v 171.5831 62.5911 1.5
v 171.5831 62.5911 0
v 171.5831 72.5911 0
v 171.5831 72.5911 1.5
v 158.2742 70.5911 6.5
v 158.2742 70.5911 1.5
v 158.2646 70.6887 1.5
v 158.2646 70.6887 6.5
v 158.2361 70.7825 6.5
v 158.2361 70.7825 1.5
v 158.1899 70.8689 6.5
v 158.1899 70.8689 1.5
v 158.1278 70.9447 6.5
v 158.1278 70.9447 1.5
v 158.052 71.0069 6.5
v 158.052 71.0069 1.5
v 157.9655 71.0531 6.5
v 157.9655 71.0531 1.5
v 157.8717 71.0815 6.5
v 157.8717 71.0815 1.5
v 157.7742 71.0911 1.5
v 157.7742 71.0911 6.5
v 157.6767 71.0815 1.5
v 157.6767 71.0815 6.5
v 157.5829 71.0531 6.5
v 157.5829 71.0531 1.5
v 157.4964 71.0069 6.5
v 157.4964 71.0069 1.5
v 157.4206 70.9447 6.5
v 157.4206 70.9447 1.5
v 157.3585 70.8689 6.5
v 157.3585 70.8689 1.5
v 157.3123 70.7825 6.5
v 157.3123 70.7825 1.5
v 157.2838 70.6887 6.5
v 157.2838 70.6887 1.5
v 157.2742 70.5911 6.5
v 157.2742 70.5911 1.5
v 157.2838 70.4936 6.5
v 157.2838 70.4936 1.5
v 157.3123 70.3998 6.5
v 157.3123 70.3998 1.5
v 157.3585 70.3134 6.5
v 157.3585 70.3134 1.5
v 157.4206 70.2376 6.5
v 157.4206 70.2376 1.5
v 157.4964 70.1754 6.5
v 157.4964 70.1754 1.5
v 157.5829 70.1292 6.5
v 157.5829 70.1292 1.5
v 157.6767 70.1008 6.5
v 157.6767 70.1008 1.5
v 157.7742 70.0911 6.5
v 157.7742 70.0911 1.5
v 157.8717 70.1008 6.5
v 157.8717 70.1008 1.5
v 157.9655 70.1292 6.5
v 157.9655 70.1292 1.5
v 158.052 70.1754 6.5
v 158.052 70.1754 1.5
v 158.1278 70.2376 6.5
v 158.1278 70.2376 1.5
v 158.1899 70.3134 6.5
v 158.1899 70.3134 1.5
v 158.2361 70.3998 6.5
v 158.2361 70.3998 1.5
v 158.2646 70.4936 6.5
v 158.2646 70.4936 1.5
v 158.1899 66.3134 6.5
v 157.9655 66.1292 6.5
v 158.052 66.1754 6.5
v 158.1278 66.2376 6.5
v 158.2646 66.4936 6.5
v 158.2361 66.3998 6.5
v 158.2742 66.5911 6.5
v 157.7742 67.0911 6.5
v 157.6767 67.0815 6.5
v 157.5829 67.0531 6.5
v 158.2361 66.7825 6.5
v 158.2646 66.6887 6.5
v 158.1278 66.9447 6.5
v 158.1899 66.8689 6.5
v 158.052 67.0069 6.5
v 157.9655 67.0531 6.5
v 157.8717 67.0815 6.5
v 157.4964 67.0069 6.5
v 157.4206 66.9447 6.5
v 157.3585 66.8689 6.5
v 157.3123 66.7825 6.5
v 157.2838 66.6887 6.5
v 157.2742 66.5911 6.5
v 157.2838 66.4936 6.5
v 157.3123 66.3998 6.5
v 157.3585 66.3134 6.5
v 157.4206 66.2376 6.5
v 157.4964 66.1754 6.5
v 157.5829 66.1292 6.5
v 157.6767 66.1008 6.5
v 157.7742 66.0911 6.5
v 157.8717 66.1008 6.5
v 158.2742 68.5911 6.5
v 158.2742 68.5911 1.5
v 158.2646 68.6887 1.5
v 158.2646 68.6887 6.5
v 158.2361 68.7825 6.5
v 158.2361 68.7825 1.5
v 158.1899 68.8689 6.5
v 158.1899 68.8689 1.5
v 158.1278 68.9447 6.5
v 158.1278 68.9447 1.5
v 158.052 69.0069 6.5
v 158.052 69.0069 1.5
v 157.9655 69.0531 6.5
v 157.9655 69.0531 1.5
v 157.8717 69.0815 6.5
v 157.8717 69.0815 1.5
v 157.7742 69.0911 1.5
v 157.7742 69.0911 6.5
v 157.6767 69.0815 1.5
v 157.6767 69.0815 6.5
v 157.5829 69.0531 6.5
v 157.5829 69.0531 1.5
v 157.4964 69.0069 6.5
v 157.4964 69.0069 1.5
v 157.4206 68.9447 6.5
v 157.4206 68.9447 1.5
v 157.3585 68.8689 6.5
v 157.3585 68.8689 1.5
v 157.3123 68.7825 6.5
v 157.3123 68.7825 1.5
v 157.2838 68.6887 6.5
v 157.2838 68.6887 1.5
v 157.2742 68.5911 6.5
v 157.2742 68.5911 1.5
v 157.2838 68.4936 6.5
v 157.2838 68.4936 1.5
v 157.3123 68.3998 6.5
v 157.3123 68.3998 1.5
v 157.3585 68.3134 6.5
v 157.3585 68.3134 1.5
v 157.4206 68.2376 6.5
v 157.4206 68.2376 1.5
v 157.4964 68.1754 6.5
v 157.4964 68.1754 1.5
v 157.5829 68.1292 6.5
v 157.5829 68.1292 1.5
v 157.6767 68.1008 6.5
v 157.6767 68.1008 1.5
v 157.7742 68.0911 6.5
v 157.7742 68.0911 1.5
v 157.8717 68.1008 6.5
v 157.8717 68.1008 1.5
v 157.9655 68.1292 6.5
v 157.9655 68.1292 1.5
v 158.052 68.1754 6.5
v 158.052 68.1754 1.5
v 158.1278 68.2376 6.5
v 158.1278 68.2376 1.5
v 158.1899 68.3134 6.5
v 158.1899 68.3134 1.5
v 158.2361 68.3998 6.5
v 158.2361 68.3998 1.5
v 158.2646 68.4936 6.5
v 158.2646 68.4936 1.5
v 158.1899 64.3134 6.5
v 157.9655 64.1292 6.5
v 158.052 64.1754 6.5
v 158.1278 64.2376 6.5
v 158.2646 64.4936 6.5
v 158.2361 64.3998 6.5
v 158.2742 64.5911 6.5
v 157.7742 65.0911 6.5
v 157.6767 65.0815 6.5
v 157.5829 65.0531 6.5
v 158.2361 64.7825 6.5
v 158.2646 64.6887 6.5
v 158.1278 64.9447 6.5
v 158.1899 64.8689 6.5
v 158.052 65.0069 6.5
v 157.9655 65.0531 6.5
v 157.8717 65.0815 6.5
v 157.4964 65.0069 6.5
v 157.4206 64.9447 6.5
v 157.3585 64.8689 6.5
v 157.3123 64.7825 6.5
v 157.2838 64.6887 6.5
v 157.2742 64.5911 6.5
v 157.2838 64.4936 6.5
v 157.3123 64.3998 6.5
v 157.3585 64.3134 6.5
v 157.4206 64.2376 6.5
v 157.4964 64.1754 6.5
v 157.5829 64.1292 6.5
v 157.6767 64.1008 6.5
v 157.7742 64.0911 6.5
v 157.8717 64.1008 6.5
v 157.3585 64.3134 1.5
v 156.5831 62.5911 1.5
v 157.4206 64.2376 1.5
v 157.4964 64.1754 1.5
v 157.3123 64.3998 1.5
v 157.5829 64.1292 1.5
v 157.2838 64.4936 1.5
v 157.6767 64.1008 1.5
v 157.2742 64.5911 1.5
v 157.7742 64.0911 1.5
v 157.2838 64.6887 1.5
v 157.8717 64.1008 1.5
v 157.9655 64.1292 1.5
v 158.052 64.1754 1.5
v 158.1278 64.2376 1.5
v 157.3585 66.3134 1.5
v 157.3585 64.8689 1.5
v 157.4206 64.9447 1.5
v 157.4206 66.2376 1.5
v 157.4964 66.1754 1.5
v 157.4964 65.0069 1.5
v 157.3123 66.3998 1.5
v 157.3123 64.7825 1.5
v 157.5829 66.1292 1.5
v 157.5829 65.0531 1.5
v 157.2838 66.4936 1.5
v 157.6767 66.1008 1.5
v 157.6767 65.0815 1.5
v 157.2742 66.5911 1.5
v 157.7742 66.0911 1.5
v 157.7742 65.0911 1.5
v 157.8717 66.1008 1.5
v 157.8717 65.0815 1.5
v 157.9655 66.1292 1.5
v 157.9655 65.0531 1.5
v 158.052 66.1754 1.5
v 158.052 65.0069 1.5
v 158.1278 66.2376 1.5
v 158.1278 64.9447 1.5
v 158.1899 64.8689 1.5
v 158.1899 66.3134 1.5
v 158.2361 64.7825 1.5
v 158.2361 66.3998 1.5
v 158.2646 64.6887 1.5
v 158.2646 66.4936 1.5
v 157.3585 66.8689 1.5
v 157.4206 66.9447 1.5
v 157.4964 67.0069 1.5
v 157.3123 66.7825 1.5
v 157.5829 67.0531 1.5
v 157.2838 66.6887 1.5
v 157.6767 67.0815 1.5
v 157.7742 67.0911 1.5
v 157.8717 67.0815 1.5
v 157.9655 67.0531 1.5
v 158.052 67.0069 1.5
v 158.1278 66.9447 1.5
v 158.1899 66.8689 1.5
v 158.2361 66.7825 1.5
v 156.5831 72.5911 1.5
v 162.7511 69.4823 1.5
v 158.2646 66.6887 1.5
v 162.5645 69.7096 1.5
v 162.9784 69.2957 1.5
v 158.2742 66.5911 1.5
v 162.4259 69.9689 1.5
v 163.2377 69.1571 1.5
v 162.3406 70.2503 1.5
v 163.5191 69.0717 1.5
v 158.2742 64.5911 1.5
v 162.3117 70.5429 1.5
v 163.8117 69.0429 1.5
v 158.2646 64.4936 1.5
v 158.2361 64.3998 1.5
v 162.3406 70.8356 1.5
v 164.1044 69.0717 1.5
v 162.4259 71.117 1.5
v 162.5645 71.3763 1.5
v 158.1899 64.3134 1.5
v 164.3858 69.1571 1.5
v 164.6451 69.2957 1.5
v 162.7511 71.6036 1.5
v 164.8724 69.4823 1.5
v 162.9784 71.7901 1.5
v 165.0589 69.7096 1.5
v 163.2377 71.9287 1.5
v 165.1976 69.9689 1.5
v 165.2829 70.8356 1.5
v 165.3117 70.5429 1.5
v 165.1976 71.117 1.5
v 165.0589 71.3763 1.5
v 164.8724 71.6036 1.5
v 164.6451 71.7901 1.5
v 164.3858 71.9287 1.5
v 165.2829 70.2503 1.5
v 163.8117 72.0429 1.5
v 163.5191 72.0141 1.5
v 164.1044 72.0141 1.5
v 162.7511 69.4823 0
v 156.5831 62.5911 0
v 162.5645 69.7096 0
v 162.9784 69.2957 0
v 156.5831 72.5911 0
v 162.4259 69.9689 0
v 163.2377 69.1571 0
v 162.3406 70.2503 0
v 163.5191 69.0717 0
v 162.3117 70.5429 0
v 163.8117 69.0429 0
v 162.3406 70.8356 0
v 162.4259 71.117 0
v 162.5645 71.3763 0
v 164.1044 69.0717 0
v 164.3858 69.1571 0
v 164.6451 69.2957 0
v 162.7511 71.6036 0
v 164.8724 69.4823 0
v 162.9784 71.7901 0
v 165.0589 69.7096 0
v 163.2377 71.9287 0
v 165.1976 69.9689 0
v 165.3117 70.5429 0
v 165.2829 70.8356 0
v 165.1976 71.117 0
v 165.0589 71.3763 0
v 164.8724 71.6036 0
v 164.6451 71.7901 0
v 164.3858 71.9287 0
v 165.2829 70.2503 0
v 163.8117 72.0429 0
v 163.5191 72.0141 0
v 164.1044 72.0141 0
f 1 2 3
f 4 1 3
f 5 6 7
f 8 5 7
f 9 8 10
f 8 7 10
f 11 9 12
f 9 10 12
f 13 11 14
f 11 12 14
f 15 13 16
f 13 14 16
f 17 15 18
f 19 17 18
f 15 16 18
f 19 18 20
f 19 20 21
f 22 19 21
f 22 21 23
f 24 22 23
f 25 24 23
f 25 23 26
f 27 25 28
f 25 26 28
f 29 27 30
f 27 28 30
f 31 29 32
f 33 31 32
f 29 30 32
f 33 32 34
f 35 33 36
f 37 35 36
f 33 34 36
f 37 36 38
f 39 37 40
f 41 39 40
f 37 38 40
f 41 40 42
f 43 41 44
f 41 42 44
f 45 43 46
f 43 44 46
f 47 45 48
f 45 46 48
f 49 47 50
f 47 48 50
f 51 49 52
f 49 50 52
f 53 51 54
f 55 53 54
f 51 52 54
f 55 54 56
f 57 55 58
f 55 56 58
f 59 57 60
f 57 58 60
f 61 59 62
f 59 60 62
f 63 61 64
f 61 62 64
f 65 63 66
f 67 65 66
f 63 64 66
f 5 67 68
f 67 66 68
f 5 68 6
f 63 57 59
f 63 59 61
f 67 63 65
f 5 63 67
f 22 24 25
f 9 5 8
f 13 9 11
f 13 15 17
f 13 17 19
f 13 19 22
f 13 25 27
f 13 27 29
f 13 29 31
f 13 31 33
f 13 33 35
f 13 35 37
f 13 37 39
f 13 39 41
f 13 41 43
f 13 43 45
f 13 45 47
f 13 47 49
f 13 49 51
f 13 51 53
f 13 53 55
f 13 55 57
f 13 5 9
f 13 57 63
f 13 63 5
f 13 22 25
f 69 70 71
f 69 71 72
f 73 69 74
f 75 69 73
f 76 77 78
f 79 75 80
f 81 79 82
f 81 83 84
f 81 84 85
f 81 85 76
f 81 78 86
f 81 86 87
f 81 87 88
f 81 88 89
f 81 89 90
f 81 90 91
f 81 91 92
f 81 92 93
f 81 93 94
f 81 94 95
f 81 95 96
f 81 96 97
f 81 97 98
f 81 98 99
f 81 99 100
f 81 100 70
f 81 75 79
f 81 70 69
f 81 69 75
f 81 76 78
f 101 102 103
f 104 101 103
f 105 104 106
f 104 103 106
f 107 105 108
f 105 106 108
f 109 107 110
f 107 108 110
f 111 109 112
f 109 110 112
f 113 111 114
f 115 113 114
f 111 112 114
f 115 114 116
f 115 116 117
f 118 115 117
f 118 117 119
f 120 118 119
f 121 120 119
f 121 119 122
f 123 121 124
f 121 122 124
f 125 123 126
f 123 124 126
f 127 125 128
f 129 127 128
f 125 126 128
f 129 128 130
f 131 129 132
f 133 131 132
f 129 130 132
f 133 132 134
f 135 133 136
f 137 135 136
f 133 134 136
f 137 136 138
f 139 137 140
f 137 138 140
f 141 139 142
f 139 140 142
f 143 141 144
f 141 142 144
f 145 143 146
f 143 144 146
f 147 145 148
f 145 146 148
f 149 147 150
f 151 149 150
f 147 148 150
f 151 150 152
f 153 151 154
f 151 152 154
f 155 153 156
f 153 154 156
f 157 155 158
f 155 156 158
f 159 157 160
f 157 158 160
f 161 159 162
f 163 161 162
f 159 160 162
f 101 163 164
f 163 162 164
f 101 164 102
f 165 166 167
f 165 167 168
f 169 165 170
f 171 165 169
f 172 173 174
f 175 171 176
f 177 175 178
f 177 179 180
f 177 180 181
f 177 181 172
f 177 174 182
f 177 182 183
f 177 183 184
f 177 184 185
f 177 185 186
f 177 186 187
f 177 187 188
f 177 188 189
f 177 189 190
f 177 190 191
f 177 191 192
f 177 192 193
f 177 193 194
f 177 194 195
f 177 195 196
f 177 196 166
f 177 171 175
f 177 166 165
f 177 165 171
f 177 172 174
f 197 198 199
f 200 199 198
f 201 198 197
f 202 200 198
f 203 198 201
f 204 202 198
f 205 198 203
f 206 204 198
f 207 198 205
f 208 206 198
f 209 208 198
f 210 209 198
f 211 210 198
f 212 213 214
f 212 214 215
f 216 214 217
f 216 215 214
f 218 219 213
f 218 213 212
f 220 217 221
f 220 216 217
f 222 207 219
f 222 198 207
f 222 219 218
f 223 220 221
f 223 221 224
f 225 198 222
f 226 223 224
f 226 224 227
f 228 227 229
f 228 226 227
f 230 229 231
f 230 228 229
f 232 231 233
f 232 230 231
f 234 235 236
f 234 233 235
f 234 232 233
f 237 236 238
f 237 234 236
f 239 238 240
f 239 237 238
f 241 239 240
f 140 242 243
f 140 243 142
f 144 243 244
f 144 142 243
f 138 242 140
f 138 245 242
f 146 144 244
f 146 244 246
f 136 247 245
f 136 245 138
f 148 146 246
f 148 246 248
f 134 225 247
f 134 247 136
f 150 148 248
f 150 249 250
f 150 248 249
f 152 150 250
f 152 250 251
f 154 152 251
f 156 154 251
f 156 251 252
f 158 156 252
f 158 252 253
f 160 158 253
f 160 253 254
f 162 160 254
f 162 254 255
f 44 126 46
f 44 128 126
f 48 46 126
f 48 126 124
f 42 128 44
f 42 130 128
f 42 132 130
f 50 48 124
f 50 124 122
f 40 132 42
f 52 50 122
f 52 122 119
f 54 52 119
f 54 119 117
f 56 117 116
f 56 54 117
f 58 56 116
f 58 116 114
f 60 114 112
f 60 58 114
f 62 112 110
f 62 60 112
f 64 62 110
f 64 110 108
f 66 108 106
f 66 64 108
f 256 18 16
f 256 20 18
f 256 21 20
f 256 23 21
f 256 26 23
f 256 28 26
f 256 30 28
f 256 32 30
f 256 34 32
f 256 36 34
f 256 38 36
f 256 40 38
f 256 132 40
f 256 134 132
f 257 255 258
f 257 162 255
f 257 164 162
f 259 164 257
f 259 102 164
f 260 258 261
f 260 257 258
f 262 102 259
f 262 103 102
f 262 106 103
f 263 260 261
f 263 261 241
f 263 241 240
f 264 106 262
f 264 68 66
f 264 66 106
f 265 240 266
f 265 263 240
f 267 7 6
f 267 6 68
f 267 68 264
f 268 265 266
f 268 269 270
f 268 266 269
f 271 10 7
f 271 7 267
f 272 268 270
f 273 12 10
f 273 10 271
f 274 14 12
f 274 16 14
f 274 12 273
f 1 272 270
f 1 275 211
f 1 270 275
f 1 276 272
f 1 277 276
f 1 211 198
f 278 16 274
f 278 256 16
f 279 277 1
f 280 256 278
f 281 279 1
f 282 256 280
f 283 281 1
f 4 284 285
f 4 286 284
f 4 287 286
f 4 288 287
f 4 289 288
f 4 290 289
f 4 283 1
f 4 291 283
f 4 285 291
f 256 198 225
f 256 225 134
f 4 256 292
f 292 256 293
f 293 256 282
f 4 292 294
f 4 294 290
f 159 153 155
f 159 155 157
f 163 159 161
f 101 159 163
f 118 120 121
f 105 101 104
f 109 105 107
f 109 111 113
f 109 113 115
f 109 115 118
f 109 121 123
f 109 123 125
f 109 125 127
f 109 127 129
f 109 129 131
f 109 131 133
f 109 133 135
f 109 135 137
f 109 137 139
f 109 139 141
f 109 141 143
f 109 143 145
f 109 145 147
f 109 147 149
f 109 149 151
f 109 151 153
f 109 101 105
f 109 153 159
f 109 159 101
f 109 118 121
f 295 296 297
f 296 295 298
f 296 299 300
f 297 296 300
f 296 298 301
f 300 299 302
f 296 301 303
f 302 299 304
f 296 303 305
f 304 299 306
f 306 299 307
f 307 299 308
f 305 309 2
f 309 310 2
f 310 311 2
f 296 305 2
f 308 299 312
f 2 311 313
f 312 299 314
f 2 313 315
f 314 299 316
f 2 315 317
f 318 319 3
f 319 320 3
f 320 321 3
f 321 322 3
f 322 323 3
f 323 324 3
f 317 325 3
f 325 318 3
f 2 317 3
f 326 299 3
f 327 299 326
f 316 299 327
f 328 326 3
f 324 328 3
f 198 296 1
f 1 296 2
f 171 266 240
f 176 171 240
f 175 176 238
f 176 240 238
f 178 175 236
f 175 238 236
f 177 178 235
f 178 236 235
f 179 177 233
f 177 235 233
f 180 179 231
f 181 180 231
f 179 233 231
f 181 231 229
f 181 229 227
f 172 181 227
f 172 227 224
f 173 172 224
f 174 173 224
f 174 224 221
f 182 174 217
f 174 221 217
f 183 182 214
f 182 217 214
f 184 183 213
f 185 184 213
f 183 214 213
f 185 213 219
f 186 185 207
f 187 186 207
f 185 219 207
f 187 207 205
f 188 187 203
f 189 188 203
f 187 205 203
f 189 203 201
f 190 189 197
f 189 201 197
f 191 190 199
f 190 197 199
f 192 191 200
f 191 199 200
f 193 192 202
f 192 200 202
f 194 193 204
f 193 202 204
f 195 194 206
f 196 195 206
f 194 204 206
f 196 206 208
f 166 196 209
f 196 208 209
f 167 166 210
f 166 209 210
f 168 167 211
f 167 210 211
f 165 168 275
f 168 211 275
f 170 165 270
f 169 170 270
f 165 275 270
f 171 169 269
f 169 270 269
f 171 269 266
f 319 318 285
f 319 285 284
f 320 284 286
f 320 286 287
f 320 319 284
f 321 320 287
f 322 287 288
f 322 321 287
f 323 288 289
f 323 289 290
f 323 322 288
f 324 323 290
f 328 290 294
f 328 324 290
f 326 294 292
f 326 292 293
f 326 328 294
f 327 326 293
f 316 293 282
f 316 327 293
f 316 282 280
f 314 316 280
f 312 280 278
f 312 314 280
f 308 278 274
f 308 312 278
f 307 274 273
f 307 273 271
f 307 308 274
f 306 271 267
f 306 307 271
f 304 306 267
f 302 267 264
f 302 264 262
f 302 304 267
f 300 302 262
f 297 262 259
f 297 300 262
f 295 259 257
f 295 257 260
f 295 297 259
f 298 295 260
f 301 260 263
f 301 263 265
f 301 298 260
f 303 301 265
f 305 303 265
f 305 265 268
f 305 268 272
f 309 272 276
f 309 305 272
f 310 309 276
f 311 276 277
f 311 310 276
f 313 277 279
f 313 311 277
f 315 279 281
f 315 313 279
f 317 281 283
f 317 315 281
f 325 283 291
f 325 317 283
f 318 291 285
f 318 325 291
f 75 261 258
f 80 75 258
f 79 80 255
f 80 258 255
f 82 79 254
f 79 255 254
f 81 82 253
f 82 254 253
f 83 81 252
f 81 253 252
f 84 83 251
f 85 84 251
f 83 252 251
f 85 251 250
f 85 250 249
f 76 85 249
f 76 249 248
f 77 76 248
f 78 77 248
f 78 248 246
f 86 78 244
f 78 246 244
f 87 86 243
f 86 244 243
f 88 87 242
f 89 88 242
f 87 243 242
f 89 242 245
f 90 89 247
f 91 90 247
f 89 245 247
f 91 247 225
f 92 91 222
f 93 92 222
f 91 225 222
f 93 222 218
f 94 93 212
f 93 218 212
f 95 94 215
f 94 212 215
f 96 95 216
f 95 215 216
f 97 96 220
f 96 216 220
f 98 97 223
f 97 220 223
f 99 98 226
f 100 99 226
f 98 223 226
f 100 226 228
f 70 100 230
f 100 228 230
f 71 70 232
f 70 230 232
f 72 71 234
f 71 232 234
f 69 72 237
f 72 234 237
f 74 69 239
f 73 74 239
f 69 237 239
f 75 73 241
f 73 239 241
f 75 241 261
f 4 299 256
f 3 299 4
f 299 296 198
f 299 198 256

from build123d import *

# Parameters (mm, degrees)
SKETCH1_W           = 15
SKETCH1_H           = 10
SKETCH1_R           = 1.5
BOSS_EXTRUDE1_DEPTH = 1.5
SKETCH2_R           = 0.5
BOSS_EXTRUDE2_DEPTH = 5


with BuildPart() as part:
    # Sketch1 → Boss-Extrude1 (new body)
    with BuildSketch(Plane.XY):
        with Locations((164.083059714, 67.591147655)):
            Rectangle(SKETCH1_W, SKETCH1_H)
        with Locations((163.811741983, 70.542925262)):
            Circle(SKETCH1_R, mode=Mode.SUBTRACT)
    extrude(amount=BOSS_EXTRUDE1_DEPTH)

    # Sketch2 → Boss-Extrude2 (add)
    with BuildSketch(Plane.XY.offset(1.5)):
        with Locations((157.774202419, 68.591147655)):
            Circle(SKETCH2_R)
        with Locations((157.774202419, 70.591147655)):
            Circle(SKETCH2_R)
        with Locations((157.774202419, 64.591147655)):
            Circle(SKETCH2_R)
        with Locations((157.774202419, 66.591147655)):
            Circle(SKETCH2_R)
    extrude(amount=BOSS_EXTRUDE2_DEPTH)


solid = part.part
